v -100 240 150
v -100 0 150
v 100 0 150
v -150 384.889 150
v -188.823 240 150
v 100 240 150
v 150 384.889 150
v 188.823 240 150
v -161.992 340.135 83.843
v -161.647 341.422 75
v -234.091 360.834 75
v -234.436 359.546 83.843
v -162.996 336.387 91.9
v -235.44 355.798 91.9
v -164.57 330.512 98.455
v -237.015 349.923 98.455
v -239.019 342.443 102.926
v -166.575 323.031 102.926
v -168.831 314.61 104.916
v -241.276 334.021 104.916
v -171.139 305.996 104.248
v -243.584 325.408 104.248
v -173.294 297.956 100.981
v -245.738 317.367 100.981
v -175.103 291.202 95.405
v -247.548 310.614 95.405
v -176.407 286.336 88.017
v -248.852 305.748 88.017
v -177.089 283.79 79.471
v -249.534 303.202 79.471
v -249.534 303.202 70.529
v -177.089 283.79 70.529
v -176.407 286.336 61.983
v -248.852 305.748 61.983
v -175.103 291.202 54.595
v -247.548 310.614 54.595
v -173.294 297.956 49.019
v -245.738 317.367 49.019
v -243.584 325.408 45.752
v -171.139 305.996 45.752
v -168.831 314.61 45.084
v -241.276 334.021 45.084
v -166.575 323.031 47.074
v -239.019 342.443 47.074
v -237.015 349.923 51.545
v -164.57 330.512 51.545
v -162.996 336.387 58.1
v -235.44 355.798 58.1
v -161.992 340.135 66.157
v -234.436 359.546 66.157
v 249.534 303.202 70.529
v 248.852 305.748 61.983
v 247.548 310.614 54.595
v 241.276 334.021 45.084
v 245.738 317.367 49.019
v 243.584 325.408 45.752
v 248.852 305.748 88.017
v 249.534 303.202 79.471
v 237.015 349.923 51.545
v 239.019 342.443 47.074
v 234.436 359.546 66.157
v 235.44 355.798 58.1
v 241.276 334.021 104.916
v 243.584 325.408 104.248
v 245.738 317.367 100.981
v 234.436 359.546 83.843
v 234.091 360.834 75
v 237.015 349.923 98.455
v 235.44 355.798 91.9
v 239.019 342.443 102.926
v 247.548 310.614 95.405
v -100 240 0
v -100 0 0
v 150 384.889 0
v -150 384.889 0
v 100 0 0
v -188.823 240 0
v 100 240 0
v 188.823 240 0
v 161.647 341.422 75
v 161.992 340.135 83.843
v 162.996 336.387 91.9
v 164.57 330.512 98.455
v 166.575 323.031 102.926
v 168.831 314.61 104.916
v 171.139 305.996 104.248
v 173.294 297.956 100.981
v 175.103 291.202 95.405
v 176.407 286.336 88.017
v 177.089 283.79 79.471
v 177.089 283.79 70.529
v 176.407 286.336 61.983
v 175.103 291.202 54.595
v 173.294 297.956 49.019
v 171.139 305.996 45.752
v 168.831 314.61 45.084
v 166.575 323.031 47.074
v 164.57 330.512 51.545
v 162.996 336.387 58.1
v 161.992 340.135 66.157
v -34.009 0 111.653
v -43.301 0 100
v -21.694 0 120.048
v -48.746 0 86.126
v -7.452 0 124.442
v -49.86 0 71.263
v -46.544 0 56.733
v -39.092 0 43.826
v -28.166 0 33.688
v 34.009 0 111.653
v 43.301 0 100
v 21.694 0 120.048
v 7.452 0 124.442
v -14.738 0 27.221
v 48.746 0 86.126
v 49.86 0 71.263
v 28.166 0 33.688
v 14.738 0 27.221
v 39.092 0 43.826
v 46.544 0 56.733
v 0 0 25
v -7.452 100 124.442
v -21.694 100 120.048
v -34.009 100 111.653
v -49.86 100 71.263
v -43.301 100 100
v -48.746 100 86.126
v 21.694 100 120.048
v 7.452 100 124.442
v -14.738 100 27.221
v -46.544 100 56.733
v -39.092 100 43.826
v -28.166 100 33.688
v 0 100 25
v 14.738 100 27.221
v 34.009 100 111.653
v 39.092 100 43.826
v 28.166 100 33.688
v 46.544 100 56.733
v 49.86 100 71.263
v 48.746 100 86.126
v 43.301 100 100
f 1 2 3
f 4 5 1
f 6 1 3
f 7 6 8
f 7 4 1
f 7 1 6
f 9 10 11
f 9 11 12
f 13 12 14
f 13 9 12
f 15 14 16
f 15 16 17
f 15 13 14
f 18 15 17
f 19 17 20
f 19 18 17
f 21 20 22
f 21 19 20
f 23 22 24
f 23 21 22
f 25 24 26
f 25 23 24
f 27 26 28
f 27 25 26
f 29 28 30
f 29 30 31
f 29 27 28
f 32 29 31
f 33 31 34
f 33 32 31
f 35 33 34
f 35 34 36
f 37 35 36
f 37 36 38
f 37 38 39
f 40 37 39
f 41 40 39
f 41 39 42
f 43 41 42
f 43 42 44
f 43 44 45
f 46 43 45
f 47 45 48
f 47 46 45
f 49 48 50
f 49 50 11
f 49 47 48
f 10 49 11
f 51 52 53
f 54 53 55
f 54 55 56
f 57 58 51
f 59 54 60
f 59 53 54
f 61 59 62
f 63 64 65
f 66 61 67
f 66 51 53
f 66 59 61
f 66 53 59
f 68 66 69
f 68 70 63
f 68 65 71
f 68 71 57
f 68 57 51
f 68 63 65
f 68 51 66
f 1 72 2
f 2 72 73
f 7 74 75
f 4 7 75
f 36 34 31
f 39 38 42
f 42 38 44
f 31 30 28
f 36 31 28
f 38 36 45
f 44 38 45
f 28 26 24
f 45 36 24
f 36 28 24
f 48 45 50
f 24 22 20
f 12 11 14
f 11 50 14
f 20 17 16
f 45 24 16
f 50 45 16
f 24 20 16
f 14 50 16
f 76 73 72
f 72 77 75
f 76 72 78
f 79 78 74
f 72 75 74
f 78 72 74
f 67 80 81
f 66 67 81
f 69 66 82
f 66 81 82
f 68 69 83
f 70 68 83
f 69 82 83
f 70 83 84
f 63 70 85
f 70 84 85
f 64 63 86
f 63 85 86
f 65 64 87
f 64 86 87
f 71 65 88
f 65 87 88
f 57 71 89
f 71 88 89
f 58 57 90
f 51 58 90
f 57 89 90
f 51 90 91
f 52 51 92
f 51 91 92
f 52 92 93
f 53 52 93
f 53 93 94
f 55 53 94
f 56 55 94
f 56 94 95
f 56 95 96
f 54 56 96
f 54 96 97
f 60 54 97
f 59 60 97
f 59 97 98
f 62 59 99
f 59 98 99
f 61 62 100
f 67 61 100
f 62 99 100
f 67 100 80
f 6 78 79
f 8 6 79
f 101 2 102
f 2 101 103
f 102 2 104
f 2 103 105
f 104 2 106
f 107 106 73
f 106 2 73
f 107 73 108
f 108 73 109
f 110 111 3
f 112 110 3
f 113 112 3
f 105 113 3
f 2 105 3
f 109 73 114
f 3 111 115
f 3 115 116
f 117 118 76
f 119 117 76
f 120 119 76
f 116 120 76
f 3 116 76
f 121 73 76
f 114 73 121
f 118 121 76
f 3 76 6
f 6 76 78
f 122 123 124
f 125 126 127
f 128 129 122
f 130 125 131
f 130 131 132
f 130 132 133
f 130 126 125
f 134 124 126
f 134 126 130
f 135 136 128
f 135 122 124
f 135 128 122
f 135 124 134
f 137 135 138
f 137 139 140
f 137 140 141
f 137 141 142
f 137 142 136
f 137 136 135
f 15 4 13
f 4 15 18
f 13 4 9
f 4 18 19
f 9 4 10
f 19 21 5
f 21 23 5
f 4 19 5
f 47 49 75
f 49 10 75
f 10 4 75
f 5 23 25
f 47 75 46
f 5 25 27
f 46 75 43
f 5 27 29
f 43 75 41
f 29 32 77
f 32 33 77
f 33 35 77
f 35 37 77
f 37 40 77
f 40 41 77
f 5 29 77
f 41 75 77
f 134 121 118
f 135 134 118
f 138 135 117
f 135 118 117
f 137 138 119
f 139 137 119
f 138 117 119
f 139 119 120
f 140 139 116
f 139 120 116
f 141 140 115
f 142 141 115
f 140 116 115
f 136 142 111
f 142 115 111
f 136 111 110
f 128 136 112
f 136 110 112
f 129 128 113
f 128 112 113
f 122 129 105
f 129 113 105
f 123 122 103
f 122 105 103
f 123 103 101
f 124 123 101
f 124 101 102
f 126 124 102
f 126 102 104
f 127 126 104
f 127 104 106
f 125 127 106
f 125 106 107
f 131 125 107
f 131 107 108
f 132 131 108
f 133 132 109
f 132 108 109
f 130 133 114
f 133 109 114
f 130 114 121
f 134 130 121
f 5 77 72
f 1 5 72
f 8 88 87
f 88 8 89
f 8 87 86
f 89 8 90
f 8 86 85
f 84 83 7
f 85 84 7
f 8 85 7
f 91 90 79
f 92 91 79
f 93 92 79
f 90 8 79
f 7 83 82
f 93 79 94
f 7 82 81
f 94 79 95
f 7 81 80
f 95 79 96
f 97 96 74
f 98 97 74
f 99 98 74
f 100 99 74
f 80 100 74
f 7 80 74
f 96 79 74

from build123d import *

# Parameters (mm, degrees)
EXTRUDE_1_DEPTH     = 150
SKETCH_3_R          = 30
EXTRUDE_2_DEPTH     = 75
SKETCH_4_R          = 50
CUT_EXTRUDE_1_DEPTH = 100


with BuildPart() as part:
    # 草图1 → 凸台-拉伸1 (new body)
    with BuildSketch(Plane.XY):
        Polygon((-100, 0), (100, 0), (100, 240), (188.822856765, 240), (150, 384.888873943), (-150, 384.888873943), (-188.822856765, 240), (-100, 240), align=None)
    extrude(amount=EXTRUDE_1_DEPTH)

    # 草图3 → 凸台-拉伸2 (add)
    with BuildSketch(Plane(origin=(236.17412377, 63.282665737, 0), x_dir=(0, 0, -1), z_dir=(0.9659258262890672, 0.2588190451025252, 0))):
        with Locations(Location((-75, 257.951246828, 0), (0, 0, 90))):
            Circle(SKETCH_3_R)
    extrude_2 = extrude(amount=EXTRUDE_2_DEPTH)

    # 镜向1: 凸台-拉伸2 across plane
    add(extrude_2.mirror(Plane.ZY))

    # 草图4 → 切除-拉伸1 (cut)
    with BuildSketch(Plane.XZ):
        with Locations(Location((0, 75, 0), (0, 0, 270))):
            Circle(SKETCH_4_R)
    extrude(amount=-CUT_EXTRUDE_1_DEPTH, mode=Mode.SUBTRACT)


solid = part.part
